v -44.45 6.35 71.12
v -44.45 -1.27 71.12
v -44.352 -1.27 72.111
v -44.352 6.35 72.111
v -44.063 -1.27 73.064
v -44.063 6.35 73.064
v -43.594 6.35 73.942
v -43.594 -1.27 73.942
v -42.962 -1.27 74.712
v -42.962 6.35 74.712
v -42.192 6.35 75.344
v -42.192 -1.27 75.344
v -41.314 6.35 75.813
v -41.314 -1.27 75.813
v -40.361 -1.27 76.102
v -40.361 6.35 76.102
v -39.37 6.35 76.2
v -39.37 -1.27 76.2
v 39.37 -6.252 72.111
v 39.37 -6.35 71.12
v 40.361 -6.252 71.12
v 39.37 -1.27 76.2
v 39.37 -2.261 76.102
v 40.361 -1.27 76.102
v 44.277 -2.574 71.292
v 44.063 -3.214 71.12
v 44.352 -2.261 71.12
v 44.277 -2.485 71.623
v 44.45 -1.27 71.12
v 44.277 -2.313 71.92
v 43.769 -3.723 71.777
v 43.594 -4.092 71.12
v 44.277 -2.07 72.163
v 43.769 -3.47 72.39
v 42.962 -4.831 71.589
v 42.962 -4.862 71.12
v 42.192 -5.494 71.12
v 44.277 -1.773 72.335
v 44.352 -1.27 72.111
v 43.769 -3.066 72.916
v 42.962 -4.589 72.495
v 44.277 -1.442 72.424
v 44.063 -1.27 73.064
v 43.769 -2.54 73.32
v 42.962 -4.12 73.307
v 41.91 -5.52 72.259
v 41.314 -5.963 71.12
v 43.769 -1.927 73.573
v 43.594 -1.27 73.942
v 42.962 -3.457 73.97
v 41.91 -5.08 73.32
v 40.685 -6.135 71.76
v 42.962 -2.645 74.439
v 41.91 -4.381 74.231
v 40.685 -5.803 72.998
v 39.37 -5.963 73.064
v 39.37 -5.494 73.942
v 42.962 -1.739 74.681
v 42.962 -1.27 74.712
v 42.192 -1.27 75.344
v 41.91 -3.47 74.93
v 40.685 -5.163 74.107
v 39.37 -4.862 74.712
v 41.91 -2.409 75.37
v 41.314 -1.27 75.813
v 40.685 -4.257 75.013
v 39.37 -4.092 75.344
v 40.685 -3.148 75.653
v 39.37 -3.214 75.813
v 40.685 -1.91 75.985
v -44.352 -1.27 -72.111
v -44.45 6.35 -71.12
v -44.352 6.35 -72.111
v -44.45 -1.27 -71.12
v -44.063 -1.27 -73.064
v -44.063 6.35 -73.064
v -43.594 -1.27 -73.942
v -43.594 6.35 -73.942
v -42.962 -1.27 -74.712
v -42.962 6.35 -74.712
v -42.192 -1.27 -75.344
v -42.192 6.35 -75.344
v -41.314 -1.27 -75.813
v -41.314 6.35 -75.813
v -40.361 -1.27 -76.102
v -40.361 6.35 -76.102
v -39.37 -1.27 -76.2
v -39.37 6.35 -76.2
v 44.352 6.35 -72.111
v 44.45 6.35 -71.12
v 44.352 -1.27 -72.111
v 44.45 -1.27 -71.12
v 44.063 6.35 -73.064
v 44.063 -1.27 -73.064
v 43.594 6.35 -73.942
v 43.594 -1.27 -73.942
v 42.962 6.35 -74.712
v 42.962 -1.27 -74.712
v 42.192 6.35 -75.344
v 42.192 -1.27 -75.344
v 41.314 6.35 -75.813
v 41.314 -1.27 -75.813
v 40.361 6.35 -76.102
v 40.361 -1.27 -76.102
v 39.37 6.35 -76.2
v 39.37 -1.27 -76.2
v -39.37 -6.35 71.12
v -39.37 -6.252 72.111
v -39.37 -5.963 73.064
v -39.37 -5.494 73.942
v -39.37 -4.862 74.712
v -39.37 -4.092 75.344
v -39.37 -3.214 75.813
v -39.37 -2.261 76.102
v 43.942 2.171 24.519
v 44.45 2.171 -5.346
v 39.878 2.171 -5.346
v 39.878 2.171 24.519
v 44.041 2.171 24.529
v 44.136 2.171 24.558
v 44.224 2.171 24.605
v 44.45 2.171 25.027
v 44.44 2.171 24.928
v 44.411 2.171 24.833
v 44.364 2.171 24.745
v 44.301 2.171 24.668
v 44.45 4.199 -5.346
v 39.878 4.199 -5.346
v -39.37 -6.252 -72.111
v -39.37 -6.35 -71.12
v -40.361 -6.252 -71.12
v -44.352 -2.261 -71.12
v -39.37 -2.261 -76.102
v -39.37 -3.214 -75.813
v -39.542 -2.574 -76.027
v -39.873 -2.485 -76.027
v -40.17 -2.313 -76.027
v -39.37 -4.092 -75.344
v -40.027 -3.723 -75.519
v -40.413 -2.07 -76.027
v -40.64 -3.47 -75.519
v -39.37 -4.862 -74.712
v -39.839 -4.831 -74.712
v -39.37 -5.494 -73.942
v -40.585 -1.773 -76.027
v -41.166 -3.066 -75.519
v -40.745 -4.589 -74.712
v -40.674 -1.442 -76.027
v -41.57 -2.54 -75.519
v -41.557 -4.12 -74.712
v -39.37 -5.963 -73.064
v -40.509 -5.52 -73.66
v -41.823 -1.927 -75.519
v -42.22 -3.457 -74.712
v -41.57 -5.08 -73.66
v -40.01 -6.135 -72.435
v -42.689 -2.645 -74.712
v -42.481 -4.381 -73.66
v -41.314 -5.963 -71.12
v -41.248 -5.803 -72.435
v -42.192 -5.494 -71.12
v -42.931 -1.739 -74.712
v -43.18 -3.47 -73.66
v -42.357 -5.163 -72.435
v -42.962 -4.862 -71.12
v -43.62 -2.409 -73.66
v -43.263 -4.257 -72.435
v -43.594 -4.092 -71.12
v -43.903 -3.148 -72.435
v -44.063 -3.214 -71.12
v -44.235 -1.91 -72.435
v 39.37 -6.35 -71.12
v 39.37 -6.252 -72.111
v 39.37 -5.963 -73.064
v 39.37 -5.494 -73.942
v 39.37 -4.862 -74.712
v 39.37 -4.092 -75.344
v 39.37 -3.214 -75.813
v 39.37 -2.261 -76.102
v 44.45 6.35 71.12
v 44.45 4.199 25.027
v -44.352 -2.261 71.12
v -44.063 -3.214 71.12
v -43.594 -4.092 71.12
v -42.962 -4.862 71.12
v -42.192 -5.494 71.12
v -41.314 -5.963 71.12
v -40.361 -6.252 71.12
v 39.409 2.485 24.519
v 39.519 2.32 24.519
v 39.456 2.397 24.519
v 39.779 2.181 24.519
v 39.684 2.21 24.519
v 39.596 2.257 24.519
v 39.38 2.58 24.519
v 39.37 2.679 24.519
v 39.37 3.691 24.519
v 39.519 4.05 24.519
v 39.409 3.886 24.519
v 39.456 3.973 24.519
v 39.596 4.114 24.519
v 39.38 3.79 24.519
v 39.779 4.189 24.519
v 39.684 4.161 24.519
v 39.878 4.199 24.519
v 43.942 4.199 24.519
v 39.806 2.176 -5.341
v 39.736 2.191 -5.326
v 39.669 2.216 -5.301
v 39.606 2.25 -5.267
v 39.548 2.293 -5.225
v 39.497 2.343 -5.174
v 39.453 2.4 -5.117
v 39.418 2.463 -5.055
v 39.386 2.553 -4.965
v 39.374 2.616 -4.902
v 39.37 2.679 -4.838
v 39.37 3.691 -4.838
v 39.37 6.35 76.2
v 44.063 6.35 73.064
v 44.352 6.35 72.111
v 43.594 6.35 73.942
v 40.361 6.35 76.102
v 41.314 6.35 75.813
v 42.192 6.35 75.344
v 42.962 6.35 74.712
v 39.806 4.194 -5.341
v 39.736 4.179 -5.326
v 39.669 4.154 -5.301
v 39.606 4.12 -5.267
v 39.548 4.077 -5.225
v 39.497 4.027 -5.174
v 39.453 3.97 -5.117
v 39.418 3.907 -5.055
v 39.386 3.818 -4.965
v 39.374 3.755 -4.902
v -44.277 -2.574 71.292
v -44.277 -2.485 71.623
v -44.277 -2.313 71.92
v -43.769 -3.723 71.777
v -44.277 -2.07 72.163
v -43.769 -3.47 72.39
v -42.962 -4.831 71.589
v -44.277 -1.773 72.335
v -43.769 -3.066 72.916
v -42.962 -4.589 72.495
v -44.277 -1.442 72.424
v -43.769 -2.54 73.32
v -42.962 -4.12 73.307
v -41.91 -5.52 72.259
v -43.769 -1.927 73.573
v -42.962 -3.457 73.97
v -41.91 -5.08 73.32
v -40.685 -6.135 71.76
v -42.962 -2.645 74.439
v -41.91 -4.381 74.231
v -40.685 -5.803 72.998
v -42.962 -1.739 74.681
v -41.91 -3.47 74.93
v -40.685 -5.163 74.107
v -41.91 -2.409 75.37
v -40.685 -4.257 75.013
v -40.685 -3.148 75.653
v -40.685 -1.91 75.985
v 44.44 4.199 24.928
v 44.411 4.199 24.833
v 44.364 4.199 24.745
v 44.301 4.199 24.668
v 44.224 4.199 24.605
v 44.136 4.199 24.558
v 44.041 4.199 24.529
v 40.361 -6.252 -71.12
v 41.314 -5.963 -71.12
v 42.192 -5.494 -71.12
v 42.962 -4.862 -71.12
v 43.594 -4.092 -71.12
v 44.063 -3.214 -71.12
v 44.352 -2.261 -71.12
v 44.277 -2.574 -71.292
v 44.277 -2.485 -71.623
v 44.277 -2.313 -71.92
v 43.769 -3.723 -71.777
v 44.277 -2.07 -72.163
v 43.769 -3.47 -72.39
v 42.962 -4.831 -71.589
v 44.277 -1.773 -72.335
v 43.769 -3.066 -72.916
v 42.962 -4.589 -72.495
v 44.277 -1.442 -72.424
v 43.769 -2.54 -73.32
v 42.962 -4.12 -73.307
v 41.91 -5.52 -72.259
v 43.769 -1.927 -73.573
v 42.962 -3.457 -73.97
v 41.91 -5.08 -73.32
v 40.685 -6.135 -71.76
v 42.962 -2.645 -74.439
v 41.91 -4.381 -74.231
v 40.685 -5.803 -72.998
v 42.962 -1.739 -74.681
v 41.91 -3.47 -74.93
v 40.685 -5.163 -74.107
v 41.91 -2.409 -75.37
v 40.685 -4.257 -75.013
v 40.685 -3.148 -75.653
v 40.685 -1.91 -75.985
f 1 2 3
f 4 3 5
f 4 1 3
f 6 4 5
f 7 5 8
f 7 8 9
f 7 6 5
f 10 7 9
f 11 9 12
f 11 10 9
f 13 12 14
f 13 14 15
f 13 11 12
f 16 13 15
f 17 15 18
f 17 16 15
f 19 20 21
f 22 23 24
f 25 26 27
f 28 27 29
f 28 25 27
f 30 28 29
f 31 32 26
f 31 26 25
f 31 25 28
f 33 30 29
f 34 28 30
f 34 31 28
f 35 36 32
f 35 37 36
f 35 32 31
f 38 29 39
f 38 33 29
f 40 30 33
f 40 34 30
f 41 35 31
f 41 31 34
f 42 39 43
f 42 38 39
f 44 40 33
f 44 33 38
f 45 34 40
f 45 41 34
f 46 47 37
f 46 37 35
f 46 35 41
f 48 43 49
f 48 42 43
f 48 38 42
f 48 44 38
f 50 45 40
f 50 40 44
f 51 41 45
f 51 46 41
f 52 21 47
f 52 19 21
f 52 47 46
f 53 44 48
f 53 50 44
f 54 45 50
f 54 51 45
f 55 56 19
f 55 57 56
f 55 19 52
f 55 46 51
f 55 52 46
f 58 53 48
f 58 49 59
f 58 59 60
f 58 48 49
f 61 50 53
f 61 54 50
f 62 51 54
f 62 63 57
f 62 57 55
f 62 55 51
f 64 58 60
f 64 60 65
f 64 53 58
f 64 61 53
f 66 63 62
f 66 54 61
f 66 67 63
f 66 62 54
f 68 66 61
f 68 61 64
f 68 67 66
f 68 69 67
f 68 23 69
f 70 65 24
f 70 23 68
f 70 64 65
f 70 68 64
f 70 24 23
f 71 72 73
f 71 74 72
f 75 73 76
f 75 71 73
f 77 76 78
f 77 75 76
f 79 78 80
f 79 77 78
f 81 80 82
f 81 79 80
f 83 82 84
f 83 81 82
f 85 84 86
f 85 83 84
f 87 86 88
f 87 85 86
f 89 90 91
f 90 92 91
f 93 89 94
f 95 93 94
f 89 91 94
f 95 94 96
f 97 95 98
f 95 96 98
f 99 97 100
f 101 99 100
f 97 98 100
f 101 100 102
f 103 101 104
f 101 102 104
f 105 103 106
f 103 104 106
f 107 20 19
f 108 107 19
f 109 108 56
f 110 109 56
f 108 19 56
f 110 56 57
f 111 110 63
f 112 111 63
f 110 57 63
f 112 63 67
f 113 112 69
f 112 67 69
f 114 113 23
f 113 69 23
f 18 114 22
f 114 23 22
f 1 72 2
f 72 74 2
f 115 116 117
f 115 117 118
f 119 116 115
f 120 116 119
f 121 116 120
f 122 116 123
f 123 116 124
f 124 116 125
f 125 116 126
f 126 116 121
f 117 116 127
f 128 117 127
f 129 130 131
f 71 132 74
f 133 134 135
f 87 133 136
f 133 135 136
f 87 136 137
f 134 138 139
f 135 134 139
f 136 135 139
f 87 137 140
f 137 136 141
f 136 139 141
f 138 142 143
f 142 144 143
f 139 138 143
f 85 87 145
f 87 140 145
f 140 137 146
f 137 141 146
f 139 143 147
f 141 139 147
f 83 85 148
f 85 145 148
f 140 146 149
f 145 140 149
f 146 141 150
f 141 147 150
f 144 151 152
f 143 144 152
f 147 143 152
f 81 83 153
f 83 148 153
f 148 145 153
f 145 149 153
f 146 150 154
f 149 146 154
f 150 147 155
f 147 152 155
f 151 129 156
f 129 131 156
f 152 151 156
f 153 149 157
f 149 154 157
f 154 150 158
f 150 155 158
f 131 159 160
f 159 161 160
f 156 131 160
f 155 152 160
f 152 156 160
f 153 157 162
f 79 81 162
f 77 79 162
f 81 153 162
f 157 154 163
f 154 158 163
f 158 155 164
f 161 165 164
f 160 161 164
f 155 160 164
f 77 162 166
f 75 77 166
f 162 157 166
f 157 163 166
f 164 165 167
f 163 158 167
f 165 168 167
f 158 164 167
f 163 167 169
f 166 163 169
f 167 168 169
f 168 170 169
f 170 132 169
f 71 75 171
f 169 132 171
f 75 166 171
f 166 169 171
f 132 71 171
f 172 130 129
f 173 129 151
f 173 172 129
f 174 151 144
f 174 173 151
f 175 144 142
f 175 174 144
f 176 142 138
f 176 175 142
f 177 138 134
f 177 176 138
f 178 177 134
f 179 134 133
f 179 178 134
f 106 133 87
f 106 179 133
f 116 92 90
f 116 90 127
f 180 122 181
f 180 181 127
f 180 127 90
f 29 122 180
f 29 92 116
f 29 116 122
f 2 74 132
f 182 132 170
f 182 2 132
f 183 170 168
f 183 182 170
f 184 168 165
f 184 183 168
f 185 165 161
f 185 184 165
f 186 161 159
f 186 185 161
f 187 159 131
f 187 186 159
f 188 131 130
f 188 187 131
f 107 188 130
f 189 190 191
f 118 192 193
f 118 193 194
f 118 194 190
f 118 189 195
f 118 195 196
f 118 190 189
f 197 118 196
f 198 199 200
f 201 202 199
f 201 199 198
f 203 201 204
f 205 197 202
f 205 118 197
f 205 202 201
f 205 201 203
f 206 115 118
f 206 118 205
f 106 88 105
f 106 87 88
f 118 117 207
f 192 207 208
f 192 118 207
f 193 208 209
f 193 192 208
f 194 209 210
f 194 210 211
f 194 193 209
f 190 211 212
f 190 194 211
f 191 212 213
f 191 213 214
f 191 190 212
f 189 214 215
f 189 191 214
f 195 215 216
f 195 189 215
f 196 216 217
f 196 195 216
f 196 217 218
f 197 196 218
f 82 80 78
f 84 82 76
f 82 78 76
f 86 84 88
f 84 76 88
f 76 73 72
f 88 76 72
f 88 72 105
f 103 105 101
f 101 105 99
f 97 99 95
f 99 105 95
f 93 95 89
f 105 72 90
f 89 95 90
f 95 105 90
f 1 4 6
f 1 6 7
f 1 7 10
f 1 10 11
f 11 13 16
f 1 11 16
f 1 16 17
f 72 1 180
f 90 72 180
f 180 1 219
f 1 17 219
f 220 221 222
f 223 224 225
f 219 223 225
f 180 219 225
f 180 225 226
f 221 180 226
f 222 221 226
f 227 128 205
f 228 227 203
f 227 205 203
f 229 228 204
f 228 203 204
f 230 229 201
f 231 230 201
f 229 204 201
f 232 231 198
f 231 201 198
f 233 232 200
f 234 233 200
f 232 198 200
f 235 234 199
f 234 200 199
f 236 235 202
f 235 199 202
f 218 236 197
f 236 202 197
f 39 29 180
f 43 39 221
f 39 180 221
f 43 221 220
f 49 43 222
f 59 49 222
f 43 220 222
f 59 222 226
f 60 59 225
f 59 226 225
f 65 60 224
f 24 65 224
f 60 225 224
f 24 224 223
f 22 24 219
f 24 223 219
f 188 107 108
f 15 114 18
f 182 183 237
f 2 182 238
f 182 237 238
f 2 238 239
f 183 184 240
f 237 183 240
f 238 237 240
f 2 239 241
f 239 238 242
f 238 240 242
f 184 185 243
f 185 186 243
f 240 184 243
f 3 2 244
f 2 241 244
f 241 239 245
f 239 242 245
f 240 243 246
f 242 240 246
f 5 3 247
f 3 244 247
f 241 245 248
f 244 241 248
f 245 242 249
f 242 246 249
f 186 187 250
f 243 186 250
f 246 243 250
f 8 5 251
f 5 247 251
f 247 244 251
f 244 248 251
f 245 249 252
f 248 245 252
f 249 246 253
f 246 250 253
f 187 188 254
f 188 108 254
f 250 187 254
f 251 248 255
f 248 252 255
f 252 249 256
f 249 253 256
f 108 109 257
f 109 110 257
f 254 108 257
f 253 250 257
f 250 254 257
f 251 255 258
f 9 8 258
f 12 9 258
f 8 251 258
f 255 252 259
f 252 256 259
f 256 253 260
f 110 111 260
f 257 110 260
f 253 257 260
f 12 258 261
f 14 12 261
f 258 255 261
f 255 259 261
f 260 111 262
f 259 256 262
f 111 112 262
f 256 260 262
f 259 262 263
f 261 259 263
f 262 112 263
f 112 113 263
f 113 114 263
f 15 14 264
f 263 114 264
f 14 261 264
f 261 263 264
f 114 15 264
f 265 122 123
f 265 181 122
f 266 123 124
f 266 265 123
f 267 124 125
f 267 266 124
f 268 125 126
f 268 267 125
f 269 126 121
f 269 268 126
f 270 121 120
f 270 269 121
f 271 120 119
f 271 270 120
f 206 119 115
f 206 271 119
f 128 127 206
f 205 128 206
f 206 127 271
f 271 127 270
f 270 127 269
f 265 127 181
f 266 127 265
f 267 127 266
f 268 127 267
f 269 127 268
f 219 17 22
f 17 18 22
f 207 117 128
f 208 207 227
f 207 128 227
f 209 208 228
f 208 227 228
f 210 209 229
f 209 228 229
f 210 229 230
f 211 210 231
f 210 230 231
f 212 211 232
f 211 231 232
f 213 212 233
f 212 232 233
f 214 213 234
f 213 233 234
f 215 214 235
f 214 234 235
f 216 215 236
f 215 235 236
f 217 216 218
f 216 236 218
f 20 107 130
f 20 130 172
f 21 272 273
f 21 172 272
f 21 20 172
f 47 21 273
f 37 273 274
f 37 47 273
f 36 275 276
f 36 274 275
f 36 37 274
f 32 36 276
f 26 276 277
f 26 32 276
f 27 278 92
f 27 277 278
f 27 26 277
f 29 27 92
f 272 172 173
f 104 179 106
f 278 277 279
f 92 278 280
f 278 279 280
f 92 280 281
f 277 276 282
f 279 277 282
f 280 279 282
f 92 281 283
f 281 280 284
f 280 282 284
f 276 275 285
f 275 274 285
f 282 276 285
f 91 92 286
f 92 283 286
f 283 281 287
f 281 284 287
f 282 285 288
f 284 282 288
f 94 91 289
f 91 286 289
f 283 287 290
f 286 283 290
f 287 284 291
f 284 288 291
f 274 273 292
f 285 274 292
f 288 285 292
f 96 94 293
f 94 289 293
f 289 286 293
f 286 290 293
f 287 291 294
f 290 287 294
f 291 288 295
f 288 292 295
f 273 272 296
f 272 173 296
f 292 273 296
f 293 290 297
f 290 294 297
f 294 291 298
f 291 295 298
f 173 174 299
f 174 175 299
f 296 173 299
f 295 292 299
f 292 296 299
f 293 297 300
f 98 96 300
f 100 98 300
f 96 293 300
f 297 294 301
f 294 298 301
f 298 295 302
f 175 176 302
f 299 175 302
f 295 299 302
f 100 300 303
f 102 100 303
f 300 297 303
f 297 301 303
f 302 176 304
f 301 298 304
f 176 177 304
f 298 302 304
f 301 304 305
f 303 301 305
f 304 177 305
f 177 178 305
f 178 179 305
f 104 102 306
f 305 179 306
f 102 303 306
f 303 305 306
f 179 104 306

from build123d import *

# Parameters (mm, degrees)
F0_W     = 88.9
F0_H     = 152.4
F1_DEPTH = 6.35
F2_R     = 5.08
F3_W     = 2.027904
F3_H     = 29.865486
F4_DEPTH = 5.08
F5_R     = 0.508


with BuildPart() as f1:
    # F0 (on Front) → F1 (new body, symmetric)
    with BuildSketch(Plane.XZ):
        Rectangle(F0_W, F0_H)
    extrude(amount=F1_DEPTH, both=True)

    # F2
    f2_edges = [f1.edges().sort_by_distance(p)[0] for p in [
        (0, -6.35, 76.2),
        (-44.45, -6.35, 0),
        (0, -6.35, -76.2),
        (44.45, -6.35, 0),
        (-44.45, 0, 76.2),
        (-44.45, 0, -76.2),
        (44.45, 0, -76.2),
        (44.45, 0, 76.2),
    ]]
    fillet(f2_edges, radius=F2_R)

    # F3 (on face) → F4 (cut)
    with BuildSketch(Plane.YZ.offset(44.45)):
        with Locations((3.185241, 9.586453)):
            Rectangle(F3_W, F3_H)
    extrude(amount=-F4_DEPTH, mode=Mode.SUBTRACT)

    # F5
    f5_edges = [f1.edges().sort_by_distance(p)[0] for p in [
        (39.37, 4.199193, 9.586453),
        (39.37, 2.171289, 9.586453),
        (39.37, 3.185241, -5.34629),
        (44.45, 3.185241, 24.519196),
    ]]
    fillet(f5_edges, radius=F5_R)


solid = f1.part
